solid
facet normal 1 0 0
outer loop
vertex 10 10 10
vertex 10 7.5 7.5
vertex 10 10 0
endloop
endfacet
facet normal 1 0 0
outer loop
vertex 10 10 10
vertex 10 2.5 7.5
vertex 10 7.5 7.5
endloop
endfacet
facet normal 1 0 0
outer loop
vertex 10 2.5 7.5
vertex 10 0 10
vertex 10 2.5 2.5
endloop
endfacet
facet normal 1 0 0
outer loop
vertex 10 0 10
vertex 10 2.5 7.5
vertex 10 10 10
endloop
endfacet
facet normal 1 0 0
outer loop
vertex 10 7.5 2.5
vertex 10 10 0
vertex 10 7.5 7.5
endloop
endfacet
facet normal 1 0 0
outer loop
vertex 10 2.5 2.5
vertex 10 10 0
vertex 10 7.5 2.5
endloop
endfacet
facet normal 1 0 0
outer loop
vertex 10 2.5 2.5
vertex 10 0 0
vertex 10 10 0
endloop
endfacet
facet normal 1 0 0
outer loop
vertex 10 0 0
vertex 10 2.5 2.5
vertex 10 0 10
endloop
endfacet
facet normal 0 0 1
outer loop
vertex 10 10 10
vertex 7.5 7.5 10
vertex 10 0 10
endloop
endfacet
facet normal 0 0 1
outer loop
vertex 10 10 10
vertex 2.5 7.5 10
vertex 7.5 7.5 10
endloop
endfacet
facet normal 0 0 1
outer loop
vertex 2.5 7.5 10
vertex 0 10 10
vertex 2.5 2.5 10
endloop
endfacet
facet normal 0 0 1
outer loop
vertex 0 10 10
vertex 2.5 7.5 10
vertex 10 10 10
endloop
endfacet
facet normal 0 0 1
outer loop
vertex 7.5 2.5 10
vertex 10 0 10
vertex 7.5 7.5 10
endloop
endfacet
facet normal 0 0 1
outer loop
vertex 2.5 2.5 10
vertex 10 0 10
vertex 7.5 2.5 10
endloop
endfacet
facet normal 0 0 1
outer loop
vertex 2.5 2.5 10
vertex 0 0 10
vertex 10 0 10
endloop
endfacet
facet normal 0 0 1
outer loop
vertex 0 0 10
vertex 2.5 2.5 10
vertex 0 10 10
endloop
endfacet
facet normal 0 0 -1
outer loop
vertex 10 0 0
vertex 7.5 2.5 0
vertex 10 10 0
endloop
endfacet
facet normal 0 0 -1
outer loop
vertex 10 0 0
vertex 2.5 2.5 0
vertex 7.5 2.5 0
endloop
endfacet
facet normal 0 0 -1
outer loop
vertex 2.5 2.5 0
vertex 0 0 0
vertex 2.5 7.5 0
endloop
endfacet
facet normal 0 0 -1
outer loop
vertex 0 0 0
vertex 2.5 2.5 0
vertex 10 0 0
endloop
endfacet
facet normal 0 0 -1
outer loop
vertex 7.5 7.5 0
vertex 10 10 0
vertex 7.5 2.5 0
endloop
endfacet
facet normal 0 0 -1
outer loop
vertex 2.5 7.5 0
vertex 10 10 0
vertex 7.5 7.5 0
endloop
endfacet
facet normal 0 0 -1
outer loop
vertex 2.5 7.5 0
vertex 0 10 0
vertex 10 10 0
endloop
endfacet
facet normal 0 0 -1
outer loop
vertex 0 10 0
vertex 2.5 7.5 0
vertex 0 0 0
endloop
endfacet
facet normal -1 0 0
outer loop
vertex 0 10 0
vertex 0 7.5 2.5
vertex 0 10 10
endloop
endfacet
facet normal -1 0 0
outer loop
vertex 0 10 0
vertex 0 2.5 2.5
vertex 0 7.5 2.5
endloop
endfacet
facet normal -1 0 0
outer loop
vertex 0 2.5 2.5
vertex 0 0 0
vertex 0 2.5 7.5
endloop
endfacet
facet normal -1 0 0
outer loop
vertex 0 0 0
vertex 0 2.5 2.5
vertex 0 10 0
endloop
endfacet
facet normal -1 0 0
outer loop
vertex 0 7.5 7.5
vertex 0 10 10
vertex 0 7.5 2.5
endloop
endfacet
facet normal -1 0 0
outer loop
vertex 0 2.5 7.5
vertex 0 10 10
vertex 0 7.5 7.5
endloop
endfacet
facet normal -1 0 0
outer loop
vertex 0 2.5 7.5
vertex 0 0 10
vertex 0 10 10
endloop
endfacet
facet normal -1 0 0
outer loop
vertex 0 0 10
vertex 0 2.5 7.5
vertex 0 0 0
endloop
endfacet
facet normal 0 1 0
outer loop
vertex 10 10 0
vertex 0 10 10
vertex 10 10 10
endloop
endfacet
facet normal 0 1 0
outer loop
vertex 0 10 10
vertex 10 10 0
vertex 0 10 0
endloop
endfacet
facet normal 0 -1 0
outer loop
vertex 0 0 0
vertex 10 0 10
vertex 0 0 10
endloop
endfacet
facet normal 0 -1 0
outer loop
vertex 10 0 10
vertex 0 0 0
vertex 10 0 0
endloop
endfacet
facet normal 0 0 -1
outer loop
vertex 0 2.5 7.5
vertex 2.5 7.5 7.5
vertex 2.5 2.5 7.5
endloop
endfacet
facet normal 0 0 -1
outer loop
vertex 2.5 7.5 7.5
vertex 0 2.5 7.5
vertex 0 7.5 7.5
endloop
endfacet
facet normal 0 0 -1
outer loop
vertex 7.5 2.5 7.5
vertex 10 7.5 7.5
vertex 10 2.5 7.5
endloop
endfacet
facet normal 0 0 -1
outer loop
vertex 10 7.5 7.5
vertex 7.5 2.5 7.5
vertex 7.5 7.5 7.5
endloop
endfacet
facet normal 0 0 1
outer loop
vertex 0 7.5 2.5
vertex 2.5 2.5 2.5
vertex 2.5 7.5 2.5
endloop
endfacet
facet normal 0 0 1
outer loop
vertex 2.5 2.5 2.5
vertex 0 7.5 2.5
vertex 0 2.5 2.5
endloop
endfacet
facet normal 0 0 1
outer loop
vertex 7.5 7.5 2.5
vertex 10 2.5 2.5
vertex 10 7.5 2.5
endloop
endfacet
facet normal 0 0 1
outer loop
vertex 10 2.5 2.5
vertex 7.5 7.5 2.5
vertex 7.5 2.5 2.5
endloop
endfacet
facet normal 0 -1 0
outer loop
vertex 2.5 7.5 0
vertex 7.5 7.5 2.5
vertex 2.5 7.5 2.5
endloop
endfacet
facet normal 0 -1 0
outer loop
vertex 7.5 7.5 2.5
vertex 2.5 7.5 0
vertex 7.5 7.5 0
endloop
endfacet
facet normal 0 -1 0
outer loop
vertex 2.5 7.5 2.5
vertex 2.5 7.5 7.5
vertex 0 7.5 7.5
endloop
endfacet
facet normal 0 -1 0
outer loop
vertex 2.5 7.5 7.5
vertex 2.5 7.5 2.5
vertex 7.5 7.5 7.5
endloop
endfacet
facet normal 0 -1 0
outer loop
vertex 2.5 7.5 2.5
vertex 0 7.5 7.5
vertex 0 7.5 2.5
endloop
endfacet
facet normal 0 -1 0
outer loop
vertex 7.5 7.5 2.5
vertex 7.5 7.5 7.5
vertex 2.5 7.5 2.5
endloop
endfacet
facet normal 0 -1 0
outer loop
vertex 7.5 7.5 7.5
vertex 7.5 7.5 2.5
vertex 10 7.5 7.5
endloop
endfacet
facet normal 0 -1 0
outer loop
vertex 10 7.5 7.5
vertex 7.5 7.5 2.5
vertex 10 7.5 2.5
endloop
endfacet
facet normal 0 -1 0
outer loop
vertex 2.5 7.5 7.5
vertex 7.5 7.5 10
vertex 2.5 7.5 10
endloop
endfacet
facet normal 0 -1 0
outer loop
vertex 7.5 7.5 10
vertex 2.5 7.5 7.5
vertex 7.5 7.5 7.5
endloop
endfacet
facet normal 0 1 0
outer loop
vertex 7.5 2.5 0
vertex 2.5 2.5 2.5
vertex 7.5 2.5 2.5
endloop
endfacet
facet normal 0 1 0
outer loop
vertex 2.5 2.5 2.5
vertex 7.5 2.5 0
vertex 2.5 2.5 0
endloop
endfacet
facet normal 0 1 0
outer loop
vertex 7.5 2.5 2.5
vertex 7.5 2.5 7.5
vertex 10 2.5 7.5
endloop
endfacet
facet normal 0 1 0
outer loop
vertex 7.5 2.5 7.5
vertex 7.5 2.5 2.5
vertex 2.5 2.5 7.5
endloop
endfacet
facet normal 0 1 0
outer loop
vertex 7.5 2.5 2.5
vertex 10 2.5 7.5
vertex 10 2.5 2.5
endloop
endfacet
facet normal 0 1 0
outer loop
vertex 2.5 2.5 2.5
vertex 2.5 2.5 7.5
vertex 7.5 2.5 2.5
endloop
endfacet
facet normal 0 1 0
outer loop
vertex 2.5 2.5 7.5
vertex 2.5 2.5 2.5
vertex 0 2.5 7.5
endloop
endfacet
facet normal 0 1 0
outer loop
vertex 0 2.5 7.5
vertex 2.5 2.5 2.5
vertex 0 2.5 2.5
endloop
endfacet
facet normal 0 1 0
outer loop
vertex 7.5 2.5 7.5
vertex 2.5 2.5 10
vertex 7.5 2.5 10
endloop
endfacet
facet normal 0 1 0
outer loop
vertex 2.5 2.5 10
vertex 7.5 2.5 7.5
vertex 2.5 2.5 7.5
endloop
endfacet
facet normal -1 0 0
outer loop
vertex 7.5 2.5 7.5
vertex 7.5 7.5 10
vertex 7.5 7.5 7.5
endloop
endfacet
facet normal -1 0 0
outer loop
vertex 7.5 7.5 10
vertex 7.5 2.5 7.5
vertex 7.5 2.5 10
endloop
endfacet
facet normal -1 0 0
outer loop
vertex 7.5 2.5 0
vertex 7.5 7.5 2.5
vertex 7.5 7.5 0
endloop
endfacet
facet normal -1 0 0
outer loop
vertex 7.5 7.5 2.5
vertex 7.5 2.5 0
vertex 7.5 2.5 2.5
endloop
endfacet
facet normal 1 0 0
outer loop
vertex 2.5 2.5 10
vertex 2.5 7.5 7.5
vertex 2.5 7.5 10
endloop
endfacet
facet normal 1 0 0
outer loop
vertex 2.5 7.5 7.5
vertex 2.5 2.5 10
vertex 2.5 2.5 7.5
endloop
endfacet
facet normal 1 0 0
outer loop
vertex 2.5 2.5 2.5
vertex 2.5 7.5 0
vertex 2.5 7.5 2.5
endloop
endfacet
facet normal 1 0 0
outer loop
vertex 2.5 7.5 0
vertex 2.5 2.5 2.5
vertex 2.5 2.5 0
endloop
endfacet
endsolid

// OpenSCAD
difference(){
     cube([10, 10, 10]);
      
     translate([-1,2.5,2.5]) cube([12, 5, 5]);
     translate([2.5,2.5,-1]) cube([5, 5, 12]);
}
